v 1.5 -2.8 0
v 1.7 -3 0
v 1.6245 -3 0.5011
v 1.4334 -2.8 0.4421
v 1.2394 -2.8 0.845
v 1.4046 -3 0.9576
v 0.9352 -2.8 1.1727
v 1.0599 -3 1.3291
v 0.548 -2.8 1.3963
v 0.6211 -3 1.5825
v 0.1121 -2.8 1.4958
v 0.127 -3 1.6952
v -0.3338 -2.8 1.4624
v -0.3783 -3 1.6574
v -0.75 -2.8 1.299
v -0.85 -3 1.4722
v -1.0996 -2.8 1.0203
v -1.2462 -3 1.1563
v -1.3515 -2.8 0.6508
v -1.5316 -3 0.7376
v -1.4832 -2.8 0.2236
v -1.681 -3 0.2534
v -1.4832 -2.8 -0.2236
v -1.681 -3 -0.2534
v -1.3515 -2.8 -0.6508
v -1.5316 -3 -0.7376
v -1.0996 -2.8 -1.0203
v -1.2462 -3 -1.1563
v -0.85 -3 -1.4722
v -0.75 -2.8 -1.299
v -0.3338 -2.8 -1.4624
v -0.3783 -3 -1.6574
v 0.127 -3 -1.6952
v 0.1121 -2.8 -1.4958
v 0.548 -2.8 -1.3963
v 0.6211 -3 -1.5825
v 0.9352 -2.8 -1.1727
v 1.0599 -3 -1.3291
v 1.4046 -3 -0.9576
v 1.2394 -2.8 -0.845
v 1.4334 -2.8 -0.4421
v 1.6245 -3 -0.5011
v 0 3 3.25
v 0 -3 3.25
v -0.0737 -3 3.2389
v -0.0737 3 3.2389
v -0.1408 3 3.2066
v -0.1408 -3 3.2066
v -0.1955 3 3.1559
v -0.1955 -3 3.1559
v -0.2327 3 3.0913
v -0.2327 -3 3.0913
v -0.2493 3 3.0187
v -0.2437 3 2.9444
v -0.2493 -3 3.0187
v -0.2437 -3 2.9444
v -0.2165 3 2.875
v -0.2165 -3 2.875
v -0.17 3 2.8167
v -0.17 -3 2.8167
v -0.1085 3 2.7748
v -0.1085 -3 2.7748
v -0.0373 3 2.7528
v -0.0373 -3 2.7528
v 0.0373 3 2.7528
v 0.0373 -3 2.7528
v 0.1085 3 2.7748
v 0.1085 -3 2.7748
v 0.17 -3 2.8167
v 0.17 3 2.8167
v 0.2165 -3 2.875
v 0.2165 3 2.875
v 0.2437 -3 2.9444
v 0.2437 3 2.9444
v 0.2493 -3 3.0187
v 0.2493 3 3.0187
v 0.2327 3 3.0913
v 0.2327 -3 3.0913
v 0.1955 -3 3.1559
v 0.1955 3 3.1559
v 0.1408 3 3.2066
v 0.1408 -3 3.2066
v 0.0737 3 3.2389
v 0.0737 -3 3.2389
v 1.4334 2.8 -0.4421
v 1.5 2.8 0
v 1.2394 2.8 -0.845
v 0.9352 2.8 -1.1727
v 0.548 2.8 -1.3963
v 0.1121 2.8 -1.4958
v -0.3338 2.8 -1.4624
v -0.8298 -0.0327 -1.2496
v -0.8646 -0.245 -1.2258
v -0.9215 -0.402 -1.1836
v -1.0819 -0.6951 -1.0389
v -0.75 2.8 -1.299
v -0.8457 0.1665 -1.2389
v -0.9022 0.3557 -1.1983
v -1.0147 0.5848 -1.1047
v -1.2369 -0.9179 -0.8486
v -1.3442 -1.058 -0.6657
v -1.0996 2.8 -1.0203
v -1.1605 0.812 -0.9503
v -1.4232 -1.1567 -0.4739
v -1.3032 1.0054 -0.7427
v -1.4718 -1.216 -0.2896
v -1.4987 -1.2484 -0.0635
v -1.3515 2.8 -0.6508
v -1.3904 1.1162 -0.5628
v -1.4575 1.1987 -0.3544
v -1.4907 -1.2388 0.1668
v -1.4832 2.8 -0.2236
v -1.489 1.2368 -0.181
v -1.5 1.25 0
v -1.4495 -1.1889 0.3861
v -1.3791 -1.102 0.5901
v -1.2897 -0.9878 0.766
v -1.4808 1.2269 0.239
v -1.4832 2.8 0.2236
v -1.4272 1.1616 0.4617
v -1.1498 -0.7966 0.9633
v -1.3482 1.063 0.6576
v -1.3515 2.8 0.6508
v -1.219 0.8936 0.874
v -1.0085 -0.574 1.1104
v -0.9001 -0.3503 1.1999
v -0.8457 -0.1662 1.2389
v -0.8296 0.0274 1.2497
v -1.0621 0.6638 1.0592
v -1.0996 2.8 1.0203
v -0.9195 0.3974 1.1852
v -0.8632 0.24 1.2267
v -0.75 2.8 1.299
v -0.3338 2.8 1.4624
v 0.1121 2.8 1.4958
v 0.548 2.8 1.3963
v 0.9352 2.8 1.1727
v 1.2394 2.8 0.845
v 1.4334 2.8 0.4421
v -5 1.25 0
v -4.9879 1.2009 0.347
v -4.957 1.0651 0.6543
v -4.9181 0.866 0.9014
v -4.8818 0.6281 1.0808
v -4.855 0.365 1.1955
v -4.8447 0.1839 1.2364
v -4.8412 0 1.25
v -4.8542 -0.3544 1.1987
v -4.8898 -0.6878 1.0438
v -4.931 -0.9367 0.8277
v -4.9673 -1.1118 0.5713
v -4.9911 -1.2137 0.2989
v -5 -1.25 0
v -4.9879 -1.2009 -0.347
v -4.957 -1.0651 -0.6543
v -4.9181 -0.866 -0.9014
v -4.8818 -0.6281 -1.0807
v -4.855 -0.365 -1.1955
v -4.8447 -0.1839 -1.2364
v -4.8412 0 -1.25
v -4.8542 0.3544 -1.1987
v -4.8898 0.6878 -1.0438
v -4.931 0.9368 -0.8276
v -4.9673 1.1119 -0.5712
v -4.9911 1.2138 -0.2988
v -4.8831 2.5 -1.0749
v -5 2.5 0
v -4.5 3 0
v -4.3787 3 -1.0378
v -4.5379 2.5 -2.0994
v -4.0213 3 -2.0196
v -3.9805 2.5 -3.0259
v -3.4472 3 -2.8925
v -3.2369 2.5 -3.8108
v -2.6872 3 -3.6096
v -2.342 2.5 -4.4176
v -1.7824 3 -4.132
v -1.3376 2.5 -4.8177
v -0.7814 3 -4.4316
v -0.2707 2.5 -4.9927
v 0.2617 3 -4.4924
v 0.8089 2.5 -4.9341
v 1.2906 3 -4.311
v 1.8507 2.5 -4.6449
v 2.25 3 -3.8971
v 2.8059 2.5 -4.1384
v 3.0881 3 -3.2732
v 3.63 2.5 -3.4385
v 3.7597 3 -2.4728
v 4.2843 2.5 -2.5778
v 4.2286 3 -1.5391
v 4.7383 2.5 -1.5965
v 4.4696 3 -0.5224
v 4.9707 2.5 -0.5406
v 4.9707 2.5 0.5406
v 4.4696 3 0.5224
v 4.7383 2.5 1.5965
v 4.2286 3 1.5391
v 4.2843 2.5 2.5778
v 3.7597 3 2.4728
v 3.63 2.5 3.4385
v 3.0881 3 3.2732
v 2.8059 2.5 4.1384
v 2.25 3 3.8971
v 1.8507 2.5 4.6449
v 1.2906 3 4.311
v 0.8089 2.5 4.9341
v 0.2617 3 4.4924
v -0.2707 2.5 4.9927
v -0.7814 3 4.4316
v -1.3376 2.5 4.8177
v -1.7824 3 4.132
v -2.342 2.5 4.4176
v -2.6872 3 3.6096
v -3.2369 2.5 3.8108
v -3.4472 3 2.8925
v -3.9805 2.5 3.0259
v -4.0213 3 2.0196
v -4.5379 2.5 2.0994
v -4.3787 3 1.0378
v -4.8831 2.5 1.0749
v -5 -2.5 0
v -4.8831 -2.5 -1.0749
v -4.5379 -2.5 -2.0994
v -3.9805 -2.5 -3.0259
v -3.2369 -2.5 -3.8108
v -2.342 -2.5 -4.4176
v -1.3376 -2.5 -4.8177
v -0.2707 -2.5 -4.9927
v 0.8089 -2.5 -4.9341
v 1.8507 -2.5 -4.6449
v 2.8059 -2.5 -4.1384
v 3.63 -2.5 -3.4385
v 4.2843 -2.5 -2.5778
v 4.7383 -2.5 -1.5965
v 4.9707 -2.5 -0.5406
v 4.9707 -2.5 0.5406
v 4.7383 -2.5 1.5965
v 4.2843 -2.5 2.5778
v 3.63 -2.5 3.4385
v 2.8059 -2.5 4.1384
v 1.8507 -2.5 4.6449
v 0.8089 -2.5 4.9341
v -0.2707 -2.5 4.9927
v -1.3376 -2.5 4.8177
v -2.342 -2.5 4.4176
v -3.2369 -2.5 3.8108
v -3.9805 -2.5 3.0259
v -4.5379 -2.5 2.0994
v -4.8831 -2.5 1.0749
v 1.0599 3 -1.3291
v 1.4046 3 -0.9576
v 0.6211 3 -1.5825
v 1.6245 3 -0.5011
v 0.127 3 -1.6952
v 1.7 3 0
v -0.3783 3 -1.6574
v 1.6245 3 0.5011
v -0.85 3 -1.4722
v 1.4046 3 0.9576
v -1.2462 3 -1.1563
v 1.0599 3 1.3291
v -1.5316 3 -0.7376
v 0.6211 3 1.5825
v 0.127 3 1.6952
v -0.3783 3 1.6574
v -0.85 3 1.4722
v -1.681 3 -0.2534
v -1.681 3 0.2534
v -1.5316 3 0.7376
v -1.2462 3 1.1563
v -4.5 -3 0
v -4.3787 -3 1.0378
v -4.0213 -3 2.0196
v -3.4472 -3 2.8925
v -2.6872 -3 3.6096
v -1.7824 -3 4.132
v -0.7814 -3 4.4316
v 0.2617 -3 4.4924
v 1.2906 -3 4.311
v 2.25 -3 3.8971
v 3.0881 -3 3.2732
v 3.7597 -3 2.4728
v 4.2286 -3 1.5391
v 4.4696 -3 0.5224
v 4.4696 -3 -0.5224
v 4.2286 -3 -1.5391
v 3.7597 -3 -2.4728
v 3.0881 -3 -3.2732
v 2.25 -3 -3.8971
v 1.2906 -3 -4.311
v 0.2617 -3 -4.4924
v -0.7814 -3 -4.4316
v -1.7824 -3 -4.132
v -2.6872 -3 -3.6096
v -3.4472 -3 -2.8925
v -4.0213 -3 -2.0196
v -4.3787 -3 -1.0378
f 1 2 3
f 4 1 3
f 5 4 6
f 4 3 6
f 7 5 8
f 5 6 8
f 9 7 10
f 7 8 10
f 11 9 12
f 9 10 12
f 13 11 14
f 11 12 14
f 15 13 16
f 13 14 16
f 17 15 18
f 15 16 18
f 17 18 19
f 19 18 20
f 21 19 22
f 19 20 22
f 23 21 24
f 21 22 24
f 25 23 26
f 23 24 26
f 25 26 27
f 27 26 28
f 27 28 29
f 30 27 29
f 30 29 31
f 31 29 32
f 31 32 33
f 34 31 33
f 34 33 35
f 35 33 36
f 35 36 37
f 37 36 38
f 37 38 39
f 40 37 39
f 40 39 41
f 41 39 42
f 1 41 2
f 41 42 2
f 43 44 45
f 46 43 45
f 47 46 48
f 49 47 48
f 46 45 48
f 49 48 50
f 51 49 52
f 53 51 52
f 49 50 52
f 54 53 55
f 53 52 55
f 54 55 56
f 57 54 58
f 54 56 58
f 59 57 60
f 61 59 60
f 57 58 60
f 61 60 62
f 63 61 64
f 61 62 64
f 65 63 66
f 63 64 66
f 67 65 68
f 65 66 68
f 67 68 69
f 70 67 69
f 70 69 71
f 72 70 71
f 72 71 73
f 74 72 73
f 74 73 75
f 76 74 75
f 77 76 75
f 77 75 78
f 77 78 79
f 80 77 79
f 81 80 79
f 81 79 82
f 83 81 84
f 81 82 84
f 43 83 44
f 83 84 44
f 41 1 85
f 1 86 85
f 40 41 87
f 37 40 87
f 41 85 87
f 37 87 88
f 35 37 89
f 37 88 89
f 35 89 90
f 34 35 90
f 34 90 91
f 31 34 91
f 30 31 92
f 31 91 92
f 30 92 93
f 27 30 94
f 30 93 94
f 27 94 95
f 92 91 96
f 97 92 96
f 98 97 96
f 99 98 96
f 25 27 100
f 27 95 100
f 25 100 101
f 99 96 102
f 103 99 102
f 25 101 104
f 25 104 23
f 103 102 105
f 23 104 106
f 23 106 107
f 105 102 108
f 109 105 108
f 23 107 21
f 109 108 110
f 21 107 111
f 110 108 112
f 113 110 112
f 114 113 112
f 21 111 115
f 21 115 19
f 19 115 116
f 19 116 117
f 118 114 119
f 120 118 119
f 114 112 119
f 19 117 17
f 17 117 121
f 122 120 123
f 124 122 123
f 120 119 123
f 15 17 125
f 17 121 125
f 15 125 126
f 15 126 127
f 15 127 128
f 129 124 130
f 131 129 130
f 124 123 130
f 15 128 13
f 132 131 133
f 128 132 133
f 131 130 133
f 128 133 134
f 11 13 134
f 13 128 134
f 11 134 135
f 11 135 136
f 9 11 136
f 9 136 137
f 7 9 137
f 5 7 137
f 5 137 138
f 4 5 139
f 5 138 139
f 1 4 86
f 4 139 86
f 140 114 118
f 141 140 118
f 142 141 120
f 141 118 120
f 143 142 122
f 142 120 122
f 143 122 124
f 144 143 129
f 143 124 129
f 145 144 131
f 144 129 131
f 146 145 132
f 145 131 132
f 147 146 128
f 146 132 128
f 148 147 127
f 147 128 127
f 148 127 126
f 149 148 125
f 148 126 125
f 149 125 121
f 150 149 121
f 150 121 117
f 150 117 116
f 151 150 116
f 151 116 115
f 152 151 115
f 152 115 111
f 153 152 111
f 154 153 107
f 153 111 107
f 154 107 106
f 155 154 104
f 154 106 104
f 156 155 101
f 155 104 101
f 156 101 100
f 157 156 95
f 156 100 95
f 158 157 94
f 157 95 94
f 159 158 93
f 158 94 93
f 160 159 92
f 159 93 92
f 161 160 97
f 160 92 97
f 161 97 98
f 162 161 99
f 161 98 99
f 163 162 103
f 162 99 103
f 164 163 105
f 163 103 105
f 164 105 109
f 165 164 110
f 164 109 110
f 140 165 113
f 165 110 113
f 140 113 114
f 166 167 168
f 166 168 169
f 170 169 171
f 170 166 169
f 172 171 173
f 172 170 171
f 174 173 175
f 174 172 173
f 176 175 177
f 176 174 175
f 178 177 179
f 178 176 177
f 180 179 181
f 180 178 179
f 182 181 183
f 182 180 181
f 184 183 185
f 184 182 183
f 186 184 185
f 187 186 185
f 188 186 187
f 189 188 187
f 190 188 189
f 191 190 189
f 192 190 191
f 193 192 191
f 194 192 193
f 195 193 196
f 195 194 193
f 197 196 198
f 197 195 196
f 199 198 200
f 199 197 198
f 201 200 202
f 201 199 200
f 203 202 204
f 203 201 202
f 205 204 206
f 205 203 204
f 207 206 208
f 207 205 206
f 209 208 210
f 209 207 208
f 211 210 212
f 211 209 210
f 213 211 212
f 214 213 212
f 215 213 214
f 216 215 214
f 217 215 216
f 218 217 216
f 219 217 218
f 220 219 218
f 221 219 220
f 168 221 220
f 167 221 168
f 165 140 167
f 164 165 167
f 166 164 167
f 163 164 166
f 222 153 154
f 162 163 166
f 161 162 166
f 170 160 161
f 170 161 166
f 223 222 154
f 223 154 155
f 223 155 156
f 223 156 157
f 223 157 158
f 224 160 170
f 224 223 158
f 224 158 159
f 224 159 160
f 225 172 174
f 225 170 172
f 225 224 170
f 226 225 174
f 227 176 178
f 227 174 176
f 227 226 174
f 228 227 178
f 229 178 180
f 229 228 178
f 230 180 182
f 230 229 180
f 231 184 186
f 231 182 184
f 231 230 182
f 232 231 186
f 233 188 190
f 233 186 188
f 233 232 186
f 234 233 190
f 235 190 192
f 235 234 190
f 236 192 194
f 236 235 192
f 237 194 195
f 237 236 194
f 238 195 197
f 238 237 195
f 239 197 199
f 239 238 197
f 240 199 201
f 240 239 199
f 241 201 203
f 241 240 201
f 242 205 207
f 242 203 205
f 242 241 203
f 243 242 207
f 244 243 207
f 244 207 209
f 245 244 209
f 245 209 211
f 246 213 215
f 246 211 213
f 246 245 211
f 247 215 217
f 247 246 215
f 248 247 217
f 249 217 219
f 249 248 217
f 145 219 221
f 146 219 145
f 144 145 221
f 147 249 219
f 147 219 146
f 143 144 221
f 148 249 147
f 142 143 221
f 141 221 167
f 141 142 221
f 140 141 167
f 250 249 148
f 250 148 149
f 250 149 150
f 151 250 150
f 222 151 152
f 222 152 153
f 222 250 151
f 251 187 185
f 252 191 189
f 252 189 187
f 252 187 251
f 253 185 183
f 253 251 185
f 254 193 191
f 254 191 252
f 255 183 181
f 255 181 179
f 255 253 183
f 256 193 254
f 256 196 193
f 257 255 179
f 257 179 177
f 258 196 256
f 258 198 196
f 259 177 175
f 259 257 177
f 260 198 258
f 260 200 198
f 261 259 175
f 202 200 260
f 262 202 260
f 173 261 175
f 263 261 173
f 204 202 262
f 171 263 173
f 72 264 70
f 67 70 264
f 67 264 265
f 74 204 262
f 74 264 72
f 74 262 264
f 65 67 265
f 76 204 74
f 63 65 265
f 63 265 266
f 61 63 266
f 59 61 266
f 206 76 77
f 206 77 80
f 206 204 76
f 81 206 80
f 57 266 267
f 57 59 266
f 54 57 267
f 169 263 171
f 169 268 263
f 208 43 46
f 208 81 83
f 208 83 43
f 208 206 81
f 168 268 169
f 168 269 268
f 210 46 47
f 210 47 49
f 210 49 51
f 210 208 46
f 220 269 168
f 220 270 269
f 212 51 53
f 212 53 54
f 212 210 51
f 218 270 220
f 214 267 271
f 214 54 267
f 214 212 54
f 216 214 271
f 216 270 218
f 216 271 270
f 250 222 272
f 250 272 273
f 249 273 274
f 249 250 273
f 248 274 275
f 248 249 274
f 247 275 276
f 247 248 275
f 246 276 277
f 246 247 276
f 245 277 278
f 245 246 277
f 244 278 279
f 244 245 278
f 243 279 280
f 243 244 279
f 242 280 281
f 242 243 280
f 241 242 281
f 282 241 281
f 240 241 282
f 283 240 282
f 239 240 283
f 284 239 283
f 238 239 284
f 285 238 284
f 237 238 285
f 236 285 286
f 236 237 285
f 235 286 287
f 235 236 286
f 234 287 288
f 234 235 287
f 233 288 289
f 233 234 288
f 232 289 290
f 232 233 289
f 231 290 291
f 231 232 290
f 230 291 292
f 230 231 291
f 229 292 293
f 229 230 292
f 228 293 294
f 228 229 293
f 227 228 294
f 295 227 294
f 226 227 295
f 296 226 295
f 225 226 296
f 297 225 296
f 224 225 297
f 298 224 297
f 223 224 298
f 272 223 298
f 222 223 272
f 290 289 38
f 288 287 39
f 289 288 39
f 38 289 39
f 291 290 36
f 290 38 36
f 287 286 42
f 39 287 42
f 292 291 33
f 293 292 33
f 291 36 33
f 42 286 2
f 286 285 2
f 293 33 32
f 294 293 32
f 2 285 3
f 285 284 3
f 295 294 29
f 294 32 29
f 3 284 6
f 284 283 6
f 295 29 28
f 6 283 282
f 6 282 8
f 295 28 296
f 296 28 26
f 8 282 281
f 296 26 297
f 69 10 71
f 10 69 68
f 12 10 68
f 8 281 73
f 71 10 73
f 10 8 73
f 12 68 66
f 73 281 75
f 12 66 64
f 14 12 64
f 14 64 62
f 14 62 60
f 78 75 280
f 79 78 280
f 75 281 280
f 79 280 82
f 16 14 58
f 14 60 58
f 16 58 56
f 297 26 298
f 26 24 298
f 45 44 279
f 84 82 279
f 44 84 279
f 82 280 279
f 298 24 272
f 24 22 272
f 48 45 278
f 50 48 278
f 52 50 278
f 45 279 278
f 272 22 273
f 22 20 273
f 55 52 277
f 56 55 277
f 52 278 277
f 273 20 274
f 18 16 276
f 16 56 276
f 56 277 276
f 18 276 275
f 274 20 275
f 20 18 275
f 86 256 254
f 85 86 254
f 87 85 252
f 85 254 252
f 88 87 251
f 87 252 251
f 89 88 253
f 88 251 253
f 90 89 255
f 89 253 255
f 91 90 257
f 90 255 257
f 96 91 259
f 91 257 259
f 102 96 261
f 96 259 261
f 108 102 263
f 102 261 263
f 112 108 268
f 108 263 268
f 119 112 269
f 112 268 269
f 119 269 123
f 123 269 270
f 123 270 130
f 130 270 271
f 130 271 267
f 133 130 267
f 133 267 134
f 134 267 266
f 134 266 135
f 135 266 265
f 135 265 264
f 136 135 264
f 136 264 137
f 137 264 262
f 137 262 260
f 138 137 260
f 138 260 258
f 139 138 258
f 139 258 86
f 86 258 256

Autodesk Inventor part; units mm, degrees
ref_plane "YZ Plane" through (0, 0, 0) normal (1, 0, 0) x (0, 1, 0)
ref_plane "XZ Plane" through (0, 0, 0) normal (0, 1, 0) x (-1, 0, 0)
ref_plane "XY Plane" through (0, 0, 0) normal (0, 0, 1) x (1, 0, 0)
sketch "Sketch1" plane through (0, 0, 0) normal (0, 1, 0) x (-1, 0, 0)
  circle A0 centre (0, 0) radius 5
  dimension "Diameter" = 10
extrude "Extrusion1" add sketch "Sketch1" along normal mid plane 6
sketch "Sketch2" plane through (0, 3, 0) normal (0, 1, 0) x (1, 0, 0)
  circle A0 centre (0, 0) radius 1.5
  dimension "d3" = 3
extrude "Extrusion2" cut sketch "Sketch2" against normal through all
sketch "Sketch3" plane through (0, 0, 0) normal (1, 0, 0) x (0, 1, 0)
  circle A0 centre (0, 0) radius 1.25
  dimension "d6" = 2.5
extrude "Extrusion3" cut sketch "Sketch3" against normal blind 6
chamfer "Chamfer1" distance 0.5 angle 45 2 edges at (5, 3, 0) (5, -3, 0)
chamfer "Chamfer2" distance 0.2 angle 45 2 edges at (-1.5, 3, 0) (-1.5, -3, 0)
thread "Thread1" size "M3x0.5" class "6H" standard "ANSI Metric M Profile" length 5
sketch "Sketch4" plane through (0, 3, 0) normal (0, 1, 0) x (1, 0, 0)
  point P0 (0, 0)
  point P1 (0, -3)
  dimension "d17" = 3
hole "Hole1" at (0, 3, 3) direction (0, -1, 0) diameter 0.5 end through all
properties part number "Pendulum Arm Cap" material "Stainless Steel"
